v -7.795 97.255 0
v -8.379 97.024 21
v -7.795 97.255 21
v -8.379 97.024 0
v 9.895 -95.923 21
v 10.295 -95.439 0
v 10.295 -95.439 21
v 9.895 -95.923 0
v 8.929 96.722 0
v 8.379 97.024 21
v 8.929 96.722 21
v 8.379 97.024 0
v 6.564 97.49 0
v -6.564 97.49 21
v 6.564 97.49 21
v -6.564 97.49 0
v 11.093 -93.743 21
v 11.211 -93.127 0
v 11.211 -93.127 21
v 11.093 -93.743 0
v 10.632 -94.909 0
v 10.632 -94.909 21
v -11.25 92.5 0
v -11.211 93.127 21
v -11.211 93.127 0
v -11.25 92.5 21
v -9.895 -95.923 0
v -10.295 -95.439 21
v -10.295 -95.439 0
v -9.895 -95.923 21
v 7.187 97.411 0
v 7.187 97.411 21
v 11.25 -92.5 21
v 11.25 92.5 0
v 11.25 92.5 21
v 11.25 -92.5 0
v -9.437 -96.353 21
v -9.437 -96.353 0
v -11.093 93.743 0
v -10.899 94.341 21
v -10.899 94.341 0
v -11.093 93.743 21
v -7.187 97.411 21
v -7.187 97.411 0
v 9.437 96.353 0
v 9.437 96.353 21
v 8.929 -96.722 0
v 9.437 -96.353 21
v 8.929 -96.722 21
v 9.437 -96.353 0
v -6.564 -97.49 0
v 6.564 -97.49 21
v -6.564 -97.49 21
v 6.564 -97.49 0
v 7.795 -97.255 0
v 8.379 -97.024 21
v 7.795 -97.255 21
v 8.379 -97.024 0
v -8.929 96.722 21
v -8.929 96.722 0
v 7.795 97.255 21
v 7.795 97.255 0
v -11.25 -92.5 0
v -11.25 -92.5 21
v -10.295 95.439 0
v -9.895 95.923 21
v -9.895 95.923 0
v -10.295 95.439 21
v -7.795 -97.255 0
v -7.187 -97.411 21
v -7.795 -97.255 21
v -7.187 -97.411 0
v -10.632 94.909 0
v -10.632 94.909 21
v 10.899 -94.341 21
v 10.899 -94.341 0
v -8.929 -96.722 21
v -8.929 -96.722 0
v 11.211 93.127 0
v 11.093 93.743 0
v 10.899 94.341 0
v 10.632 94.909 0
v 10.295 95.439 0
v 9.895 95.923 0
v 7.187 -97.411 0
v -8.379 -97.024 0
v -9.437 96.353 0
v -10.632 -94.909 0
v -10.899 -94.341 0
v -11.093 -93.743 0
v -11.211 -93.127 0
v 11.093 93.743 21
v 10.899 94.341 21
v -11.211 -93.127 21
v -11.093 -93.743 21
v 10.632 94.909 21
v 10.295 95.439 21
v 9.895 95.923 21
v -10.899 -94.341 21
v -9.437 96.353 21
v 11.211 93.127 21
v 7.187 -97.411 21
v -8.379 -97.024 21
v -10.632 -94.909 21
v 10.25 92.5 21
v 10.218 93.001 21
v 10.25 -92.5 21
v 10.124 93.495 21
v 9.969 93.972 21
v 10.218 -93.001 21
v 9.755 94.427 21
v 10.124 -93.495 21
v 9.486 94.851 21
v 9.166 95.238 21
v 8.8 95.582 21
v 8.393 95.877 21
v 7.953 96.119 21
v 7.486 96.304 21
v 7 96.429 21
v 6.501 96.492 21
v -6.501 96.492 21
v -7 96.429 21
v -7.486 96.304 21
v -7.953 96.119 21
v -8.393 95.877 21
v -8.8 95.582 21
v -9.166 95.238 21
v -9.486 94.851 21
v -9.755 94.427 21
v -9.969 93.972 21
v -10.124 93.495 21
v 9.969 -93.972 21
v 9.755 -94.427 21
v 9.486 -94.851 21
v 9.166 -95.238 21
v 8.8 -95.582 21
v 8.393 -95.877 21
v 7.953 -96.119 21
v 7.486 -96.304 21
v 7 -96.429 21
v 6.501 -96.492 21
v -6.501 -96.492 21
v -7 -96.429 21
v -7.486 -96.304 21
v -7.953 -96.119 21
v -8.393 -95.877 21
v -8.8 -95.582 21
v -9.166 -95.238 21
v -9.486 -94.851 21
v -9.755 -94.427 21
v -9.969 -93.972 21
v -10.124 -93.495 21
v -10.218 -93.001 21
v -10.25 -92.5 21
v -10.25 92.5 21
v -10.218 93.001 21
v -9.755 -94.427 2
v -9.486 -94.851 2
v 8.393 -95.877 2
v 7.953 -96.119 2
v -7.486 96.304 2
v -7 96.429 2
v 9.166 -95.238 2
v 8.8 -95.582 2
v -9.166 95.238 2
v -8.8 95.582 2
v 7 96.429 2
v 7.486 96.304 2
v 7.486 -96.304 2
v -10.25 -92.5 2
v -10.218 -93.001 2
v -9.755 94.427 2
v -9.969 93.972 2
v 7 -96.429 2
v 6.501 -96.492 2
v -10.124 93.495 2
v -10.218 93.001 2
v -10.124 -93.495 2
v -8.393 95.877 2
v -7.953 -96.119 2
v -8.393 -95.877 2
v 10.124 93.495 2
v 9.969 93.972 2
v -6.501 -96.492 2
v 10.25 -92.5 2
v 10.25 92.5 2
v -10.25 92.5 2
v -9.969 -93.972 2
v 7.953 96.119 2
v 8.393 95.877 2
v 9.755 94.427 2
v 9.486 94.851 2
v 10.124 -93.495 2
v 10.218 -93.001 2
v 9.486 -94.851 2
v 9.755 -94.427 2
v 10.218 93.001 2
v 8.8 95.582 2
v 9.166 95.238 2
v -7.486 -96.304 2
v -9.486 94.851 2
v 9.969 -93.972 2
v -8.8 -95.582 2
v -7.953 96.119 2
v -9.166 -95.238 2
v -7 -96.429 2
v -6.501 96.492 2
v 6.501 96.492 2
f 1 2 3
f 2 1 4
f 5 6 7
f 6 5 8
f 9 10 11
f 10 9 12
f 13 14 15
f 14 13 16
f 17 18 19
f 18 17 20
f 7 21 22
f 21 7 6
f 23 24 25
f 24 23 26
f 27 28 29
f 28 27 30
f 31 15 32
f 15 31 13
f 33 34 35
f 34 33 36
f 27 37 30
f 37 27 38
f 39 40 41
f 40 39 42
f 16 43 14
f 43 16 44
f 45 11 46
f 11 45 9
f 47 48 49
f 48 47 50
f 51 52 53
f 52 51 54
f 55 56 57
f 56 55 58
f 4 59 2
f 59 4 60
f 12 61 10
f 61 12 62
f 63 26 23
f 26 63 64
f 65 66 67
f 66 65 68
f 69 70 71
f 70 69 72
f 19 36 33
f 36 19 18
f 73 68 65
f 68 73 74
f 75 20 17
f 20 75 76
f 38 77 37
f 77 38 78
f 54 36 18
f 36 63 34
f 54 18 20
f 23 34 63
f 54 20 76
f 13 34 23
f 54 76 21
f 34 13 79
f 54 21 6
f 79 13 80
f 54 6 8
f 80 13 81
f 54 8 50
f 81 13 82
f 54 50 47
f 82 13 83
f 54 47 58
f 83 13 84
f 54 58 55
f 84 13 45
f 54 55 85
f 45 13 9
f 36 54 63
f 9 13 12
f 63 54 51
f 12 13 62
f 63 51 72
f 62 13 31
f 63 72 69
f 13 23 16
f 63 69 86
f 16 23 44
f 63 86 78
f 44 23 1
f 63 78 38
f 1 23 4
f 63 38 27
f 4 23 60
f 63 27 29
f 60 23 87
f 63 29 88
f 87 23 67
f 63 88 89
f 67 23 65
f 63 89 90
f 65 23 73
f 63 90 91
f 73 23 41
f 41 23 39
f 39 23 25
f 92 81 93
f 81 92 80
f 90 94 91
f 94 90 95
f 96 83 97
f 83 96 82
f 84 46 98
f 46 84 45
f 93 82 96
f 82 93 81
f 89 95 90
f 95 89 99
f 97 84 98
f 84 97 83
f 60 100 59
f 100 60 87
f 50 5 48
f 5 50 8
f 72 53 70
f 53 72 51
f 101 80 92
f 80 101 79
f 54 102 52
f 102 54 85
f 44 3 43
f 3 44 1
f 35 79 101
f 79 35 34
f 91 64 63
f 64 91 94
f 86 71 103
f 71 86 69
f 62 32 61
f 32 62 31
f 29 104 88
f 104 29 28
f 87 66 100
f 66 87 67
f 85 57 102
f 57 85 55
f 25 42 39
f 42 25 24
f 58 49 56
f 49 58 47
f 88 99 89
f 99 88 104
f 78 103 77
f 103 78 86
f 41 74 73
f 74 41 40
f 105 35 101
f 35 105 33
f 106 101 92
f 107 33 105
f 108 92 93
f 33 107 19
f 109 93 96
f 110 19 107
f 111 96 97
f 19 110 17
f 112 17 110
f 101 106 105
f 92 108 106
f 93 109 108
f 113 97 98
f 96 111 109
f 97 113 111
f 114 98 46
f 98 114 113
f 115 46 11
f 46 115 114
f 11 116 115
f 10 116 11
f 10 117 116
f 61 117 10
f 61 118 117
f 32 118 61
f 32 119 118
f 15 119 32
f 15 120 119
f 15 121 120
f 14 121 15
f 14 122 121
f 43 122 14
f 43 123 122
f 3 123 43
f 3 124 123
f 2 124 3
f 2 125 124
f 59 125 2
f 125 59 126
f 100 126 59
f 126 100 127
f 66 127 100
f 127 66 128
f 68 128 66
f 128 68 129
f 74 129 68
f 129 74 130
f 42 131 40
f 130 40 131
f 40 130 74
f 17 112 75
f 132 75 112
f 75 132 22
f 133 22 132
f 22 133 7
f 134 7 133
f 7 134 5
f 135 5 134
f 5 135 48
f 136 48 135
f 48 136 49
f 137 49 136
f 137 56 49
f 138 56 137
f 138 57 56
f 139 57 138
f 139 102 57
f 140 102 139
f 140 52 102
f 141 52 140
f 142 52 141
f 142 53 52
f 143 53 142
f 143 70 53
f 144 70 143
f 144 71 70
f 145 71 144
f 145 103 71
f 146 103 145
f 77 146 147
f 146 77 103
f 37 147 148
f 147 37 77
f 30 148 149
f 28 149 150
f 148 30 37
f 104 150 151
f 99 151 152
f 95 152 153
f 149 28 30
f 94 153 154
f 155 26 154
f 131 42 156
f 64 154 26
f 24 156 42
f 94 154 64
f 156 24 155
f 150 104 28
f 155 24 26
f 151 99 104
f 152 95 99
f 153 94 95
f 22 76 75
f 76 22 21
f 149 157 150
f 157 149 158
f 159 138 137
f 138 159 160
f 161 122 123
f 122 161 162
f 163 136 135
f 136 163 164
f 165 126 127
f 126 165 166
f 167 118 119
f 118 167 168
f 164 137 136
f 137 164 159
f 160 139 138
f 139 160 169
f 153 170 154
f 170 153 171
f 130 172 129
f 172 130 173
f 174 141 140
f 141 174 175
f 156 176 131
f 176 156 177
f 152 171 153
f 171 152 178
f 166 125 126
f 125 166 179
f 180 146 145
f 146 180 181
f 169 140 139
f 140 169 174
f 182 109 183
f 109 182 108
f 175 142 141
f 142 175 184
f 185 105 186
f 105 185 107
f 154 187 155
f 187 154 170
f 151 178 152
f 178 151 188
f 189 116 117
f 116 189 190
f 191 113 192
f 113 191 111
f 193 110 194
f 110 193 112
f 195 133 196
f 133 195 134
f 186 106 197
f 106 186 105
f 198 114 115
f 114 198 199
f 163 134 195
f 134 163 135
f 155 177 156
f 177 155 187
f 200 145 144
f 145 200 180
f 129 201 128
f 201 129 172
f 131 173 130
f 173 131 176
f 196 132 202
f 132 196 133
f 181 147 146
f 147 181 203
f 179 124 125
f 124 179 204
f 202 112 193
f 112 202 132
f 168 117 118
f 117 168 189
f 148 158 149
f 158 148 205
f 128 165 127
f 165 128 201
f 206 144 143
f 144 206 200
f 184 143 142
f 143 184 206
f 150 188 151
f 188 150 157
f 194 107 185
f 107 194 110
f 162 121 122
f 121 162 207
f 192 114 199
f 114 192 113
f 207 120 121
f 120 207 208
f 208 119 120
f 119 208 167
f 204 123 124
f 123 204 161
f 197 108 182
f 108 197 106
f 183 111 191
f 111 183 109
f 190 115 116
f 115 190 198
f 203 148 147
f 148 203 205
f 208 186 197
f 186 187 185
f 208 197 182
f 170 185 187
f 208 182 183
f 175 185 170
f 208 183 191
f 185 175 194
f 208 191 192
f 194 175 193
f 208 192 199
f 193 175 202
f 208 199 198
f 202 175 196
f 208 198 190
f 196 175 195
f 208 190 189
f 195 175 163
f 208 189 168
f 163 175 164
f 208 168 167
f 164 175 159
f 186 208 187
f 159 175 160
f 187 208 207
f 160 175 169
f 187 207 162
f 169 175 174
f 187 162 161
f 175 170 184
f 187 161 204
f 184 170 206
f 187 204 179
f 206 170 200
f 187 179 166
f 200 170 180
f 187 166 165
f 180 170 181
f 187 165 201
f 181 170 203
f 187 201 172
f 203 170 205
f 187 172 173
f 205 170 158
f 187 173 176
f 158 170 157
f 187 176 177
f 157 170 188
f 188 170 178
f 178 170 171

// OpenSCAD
$fn = 50;


difference() {
	union() {
		hull() {
			translate(v = [-6.2500000000, 92.5000000000, 0]) {
				cylinder(h = 21, r = 5);
			}
			translate(v = [6.2500000000, 92.5000000000, 0]) {
				cylinder(h = 21, r = 5);
			}
			translate(v = [-6.2500000000, -92.5000000000, 0]) {
				cylinder(h = 21, r = 5);
			}
			translate(v = [6.2500000000, -92.5000000000, 0]) {
				cylinder(h = 21, r = 5);
			}
		}
	}
	union() {
		translate(v = [0, 0, 2]) {
			hull() {
				translate(v = [-6.2500000000, 92.5000000000, 0]) {
					cylinder(h = 19, r = 4);
				}
				translate(v = [6.2500000000, 92.5000000000, 0]) {
					cylinder(h = 19, r = 4);
				}
				translate(v = [-6.2500000000, -92.5000000000, 0]) {
					cylinder(h = 19, r = 4);
				}
				translate(v = [6.2500000000, -92.5000000000, 0]) {
					cylinder(h = 19, r = 4);
				}
			}
		}
	}
}
